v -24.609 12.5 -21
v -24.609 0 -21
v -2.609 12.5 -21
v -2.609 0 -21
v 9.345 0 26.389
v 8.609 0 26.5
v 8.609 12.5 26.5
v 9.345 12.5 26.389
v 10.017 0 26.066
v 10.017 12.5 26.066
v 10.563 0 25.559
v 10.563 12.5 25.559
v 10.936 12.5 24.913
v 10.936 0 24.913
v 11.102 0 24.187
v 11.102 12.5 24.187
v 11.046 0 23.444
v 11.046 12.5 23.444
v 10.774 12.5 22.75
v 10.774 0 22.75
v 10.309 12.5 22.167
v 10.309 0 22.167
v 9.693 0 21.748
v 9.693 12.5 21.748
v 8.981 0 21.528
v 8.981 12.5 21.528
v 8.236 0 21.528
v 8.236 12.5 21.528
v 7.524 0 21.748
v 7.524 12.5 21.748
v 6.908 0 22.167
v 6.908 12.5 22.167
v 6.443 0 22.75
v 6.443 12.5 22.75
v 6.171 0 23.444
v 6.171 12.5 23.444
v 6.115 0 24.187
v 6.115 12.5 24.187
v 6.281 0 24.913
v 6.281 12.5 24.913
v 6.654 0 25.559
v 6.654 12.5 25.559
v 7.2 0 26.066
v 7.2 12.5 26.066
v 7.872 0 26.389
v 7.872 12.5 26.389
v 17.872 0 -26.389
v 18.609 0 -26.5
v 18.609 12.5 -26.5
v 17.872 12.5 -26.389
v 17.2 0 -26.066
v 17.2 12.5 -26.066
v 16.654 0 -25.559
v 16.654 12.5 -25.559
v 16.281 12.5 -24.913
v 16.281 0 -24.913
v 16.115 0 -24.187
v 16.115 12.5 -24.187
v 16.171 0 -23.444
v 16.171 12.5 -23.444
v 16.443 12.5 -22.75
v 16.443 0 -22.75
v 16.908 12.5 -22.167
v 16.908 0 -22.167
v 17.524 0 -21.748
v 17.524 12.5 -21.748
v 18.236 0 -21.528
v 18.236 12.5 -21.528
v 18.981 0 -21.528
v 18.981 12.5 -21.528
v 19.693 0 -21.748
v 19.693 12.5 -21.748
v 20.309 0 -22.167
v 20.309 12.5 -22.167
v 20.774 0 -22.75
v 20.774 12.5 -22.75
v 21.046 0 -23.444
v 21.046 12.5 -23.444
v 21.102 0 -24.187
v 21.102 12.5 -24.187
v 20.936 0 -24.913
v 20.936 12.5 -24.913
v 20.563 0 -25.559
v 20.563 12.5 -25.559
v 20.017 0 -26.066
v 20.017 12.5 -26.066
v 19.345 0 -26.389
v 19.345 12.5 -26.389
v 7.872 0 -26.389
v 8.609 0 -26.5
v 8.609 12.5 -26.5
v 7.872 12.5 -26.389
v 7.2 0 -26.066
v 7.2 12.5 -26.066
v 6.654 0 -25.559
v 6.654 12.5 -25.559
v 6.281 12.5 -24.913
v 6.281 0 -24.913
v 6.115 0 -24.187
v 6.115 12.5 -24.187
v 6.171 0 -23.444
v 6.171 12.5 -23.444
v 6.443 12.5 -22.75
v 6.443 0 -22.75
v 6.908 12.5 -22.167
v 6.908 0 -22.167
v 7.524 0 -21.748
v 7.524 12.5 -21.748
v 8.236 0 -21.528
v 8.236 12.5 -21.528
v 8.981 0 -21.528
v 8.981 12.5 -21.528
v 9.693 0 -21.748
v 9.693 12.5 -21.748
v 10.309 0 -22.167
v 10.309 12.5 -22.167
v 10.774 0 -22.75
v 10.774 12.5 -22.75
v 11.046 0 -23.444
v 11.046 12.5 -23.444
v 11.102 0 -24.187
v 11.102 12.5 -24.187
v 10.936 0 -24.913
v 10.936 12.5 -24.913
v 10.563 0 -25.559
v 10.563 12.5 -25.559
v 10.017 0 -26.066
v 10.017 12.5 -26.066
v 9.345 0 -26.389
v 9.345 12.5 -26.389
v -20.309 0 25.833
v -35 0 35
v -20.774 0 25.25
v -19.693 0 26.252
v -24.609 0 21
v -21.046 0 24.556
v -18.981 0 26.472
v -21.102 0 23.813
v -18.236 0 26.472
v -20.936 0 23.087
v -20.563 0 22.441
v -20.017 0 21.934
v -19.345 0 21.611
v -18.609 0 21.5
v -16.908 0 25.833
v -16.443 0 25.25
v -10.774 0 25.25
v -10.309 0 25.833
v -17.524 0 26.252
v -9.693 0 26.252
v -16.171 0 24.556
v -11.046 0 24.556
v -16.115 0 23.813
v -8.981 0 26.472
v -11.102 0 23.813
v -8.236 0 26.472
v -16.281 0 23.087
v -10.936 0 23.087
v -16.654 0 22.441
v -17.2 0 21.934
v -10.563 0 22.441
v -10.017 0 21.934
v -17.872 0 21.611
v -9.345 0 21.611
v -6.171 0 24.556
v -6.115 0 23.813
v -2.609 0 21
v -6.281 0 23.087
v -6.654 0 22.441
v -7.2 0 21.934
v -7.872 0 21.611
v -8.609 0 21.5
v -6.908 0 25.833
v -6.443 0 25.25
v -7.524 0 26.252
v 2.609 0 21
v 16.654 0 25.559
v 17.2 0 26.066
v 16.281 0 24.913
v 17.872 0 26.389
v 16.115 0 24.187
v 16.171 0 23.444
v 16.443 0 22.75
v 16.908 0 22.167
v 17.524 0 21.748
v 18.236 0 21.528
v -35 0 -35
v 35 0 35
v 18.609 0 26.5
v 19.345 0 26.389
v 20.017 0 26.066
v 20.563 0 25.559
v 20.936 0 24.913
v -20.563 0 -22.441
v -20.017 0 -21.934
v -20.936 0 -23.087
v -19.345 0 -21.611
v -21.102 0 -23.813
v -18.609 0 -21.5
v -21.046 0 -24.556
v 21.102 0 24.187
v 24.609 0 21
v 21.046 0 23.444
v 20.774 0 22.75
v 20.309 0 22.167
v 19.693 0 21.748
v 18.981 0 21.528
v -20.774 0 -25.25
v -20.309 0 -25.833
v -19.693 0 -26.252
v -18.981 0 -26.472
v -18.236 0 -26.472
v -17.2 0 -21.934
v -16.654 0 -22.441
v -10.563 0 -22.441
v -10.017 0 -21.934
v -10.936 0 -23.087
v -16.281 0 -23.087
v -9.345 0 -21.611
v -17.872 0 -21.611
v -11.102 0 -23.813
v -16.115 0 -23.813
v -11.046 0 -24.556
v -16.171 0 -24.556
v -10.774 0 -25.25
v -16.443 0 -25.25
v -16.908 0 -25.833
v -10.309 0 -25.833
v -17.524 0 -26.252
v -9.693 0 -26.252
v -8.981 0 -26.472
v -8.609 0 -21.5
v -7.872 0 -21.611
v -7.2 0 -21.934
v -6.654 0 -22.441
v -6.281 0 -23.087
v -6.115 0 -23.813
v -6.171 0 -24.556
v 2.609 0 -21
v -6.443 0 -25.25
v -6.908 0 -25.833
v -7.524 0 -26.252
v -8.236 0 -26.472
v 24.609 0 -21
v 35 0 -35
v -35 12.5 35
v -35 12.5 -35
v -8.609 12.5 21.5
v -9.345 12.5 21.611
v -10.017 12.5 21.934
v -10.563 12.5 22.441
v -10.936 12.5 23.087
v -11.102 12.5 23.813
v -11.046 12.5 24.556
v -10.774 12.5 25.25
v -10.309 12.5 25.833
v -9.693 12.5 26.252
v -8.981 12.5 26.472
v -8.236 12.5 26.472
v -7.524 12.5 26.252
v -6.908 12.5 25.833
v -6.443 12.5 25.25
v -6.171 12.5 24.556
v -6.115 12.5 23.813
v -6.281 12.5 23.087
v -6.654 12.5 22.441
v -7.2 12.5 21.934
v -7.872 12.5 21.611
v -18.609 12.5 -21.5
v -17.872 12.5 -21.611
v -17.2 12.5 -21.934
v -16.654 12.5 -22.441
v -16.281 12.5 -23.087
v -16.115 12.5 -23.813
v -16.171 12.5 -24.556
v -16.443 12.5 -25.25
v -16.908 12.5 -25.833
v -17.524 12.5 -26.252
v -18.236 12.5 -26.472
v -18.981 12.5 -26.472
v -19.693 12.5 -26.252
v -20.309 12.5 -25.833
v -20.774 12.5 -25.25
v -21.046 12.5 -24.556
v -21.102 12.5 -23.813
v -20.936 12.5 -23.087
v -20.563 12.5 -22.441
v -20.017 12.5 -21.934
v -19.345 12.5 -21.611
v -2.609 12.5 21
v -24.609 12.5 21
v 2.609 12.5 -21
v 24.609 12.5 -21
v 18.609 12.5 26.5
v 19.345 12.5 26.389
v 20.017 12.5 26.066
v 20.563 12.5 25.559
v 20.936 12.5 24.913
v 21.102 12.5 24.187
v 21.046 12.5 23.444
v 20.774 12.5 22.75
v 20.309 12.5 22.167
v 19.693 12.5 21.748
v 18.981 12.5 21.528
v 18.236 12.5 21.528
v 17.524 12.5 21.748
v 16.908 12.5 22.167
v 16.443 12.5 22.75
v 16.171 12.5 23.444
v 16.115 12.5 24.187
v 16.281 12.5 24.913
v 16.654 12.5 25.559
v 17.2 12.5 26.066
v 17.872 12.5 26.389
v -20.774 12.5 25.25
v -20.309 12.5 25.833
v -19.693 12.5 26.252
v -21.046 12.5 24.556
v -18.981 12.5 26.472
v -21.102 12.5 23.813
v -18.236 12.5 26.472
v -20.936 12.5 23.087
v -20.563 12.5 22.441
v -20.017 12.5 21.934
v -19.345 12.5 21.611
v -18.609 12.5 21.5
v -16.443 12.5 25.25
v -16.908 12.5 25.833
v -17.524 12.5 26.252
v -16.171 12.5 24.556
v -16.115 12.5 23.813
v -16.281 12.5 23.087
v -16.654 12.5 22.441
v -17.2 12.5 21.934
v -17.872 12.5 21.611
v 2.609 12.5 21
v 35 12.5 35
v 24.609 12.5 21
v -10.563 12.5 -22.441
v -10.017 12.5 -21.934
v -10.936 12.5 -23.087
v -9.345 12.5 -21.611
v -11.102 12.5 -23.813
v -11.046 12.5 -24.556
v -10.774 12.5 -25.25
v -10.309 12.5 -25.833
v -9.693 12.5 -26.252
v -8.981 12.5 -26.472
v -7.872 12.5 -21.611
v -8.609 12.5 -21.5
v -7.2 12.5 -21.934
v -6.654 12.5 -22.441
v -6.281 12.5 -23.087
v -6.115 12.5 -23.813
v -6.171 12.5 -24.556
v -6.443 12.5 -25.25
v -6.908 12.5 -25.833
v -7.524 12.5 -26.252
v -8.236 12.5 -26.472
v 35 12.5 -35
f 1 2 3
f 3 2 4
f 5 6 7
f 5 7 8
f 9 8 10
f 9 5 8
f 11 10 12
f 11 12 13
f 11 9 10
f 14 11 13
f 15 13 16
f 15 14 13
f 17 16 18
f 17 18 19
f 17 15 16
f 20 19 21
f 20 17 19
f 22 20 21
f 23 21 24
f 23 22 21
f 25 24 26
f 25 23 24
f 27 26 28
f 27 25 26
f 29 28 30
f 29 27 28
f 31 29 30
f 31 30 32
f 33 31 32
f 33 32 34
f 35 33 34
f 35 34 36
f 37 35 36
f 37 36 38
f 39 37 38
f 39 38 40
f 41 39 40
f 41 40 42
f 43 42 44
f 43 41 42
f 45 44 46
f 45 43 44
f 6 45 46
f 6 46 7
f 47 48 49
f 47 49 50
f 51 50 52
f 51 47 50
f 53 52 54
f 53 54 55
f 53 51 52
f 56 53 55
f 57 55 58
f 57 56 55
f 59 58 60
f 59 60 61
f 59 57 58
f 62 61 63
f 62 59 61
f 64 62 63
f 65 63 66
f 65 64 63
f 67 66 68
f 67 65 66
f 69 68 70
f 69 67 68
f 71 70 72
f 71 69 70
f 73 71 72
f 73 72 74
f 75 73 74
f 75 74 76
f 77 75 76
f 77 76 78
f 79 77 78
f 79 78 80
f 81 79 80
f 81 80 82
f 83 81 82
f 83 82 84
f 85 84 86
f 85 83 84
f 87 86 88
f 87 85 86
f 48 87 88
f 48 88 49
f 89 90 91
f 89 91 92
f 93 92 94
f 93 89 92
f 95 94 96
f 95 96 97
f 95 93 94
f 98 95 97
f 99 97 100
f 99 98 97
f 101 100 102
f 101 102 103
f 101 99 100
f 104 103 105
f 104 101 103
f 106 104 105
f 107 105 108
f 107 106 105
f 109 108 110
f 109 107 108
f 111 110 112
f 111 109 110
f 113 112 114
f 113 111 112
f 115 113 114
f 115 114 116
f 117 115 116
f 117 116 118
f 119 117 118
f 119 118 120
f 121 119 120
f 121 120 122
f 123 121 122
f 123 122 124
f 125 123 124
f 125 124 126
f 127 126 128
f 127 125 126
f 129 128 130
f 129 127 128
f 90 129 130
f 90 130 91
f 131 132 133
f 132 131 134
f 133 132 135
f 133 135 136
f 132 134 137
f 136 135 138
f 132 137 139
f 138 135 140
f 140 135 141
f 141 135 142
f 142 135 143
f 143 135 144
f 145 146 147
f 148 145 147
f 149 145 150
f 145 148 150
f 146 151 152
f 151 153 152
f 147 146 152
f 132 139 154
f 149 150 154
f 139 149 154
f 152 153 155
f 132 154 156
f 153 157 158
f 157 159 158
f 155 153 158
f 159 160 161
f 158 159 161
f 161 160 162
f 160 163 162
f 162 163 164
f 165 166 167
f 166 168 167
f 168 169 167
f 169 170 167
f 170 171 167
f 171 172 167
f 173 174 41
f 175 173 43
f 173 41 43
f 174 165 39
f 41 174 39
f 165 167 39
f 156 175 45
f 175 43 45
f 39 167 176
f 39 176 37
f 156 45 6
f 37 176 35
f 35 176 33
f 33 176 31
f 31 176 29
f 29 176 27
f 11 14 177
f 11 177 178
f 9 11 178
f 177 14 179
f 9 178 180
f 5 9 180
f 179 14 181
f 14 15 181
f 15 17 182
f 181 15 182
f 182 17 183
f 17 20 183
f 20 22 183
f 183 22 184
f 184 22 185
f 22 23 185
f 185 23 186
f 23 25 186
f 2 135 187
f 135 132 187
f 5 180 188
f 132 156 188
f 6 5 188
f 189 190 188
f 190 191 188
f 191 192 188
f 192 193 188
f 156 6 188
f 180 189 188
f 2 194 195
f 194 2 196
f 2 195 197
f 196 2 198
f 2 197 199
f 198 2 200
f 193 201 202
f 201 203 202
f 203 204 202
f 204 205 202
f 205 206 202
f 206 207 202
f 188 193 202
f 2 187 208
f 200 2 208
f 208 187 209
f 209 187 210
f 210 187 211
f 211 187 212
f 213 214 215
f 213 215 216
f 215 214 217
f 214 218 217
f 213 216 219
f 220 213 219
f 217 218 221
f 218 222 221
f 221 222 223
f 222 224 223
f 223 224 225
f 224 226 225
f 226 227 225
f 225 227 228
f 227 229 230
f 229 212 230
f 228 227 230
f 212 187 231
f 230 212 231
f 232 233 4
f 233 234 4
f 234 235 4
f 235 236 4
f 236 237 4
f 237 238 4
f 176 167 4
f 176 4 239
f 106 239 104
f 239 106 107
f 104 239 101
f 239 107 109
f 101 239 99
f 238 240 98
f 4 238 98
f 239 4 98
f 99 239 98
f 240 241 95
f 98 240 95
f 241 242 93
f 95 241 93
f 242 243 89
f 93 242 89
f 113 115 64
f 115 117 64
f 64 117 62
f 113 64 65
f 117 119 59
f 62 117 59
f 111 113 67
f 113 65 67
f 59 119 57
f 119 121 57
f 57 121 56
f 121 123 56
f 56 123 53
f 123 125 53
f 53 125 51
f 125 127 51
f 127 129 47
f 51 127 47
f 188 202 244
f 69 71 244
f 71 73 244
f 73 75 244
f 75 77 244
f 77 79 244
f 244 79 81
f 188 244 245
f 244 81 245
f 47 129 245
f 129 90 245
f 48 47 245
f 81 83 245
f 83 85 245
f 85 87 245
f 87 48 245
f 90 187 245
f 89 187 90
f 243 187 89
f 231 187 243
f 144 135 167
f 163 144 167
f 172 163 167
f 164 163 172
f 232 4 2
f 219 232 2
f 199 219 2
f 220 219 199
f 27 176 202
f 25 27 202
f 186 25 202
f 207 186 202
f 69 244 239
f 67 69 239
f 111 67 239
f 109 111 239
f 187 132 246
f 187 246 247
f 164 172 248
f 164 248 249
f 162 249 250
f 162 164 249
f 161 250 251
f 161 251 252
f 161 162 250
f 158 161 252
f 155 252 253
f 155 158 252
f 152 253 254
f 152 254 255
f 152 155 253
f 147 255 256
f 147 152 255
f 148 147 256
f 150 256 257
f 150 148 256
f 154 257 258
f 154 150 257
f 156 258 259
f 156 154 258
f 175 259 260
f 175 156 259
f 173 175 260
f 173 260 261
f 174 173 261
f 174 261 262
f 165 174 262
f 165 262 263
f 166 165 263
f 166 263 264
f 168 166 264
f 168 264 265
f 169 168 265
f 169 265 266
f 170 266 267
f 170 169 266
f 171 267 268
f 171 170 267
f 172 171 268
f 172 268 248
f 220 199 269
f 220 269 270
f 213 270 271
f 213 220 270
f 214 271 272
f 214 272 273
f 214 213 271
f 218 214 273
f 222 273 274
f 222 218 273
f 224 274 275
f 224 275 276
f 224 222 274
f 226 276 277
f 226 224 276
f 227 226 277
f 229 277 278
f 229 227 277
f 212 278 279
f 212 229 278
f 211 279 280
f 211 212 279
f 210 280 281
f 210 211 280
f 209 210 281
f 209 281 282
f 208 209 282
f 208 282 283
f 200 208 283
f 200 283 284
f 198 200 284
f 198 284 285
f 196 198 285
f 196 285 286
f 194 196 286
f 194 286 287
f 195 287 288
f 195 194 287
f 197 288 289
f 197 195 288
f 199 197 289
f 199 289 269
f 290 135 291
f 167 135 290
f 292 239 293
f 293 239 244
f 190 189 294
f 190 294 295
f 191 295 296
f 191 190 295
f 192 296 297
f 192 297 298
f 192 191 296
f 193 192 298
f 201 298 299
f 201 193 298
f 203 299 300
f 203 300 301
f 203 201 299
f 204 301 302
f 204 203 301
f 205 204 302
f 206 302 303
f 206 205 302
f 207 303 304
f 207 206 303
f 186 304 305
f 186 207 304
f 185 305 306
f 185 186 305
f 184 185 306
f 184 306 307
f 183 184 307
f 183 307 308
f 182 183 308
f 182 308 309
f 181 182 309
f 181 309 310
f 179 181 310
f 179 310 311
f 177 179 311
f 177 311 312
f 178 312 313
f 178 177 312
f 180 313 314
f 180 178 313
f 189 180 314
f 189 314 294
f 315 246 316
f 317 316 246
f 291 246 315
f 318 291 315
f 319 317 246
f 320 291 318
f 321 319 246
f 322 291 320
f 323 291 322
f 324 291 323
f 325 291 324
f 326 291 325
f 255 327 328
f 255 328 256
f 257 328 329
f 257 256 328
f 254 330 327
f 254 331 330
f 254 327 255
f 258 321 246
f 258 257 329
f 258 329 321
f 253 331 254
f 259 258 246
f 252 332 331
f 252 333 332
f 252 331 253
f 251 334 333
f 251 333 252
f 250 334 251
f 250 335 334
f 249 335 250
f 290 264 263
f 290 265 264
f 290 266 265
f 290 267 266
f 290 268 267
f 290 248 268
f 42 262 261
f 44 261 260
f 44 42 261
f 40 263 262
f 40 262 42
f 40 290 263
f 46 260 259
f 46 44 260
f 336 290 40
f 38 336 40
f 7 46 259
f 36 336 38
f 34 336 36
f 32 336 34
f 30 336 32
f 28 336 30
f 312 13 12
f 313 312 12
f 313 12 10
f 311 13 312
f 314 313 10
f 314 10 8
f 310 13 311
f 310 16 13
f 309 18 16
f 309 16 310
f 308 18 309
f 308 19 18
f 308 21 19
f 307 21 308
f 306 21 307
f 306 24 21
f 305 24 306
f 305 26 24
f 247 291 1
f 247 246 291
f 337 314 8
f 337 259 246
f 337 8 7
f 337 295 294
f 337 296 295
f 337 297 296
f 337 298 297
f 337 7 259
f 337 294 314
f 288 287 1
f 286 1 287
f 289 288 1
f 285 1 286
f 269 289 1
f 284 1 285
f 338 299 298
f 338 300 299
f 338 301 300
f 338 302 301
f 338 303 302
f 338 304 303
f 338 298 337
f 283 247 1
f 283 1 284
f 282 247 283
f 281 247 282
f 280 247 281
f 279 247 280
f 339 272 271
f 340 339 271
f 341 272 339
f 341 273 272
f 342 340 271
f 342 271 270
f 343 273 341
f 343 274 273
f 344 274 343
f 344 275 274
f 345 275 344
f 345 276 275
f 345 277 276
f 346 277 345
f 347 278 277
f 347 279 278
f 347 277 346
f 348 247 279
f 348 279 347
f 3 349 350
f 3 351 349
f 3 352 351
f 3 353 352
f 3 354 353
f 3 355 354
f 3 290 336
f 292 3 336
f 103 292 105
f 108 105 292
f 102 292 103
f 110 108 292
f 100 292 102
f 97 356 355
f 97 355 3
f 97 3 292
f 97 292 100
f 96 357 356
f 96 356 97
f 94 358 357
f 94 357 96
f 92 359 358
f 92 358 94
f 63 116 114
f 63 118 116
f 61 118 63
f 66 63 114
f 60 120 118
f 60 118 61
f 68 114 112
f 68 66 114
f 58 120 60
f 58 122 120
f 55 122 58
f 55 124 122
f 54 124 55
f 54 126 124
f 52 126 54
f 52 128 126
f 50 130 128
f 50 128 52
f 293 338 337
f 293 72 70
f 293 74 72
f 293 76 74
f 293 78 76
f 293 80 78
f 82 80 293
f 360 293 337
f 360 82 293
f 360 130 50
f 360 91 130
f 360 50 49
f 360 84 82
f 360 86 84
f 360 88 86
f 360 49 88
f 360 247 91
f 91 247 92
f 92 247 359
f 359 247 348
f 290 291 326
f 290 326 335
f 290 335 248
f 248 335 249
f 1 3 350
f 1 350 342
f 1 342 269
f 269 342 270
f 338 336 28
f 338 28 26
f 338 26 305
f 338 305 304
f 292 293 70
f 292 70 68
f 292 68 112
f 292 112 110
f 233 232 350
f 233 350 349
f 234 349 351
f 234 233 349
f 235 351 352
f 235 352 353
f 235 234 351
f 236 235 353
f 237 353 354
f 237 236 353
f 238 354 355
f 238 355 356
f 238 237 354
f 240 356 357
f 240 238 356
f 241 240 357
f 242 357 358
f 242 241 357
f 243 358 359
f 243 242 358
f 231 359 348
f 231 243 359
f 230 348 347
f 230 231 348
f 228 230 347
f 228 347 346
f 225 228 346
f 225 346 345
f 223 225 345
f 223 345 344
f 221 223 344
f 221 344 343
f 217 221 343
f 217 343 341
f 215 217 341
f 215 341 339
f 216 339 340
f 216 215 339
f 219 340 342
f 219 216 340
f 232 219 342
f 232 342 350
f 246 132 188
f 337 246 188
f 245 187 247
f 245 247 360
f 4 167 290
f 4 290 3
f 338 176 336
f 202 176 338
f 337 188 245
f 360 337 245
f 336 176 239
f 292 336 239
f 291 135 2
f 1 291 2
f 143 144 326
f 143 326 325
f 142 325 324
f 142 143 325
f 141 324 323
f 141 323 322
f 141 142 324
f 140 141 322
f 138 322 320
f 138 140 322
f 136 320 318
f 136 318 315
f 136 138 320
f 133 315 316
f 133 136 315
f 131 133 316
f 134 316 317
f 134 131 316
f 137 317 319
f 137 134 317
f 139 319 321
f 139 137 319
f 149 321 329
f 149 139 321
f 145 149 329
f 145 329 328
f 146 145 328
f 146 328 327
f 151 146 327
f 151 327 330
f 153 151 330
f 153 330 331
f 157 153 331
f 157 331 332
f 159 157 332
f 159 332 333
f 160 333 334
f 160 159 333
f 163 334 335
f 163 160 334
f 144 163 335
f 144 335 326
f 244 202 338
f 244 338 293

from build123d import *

# Parameters (mm, degrees)
SKETCH1_W           = 70
SKETCH1_H           = 70
SKETCH1_R           = 2.5
SKETCH1_W_2         = 22
SKETCH1_H_2         = 42
BOSS_EXTRUDE1_DEPTH = 12.5


with BuildPart() as part:
    # Sketch1 → Boss-Extrude1 (new body)
    with BuildSketch(Plane(origin=(0, 0, 0), x_dir=(1, 0, 0), z_dir=(0, 1, 0))):
        Rectangle(SKETCH1_W, SKETCH1_H)
        with Locations(Location((-18.608500965, 24, 0), (0, 0, 270))):
            Circle(SKETCH1_R, mode=Mode.SUBTRACT)
        with Locations(Location((-8.608500965, 24, 0), (0, 0, 270))):
            Circle(SKETCH1_R, mode=Mode.SUBTRACT)
        with Locations(Location((-8.608500965, -24, 0), (0, 0, 90))):
            Circle(SKETCH1_R, mode=Mode.SUBTRACT)
        with Locations(Location((-18.608500965, -24, 0), (0, 0, 90))):
            Circle(SKETCH1_R, mode=Mode.SUBTRACT)
        with Locations(Location((8.608500965, -24, 0), (0, 0, 270))):
            Circle(SKETCH1_R, mode=Mode.SUBTRACT)
        with Locations(Location((18.608500965, -24, 0), (0, 0, 270))):
            Circle(SKETCH1_R, mode=Mode.SUBTRACT)
        with Locations(Location((8.608500965, 24, 0), (0, 0, 90))):
            Circle(SKETCH1_R, mode=Mode.SUBTRACT)
        with Locations(Location((18.608500965, 24, 0), (0, 0, 90))):
            Circle(SKETCH1_R, mode=Mode.SUBTRACT)
        with Locations((-13.608500965, 0)):
            Rectangle(SKETCH1_W_2, SKETCH1_H_2, mode=Mode.SUBTRACT)
        with Locations((13.608500965, 0)):
            Rectangle(SKETCH1_W_2, SKETCH1_H_2, mode=Mode.SUBTRACT)
    extrude(amount=BOSS_EXTRUDE1_DEPTH)


solid = part.part
